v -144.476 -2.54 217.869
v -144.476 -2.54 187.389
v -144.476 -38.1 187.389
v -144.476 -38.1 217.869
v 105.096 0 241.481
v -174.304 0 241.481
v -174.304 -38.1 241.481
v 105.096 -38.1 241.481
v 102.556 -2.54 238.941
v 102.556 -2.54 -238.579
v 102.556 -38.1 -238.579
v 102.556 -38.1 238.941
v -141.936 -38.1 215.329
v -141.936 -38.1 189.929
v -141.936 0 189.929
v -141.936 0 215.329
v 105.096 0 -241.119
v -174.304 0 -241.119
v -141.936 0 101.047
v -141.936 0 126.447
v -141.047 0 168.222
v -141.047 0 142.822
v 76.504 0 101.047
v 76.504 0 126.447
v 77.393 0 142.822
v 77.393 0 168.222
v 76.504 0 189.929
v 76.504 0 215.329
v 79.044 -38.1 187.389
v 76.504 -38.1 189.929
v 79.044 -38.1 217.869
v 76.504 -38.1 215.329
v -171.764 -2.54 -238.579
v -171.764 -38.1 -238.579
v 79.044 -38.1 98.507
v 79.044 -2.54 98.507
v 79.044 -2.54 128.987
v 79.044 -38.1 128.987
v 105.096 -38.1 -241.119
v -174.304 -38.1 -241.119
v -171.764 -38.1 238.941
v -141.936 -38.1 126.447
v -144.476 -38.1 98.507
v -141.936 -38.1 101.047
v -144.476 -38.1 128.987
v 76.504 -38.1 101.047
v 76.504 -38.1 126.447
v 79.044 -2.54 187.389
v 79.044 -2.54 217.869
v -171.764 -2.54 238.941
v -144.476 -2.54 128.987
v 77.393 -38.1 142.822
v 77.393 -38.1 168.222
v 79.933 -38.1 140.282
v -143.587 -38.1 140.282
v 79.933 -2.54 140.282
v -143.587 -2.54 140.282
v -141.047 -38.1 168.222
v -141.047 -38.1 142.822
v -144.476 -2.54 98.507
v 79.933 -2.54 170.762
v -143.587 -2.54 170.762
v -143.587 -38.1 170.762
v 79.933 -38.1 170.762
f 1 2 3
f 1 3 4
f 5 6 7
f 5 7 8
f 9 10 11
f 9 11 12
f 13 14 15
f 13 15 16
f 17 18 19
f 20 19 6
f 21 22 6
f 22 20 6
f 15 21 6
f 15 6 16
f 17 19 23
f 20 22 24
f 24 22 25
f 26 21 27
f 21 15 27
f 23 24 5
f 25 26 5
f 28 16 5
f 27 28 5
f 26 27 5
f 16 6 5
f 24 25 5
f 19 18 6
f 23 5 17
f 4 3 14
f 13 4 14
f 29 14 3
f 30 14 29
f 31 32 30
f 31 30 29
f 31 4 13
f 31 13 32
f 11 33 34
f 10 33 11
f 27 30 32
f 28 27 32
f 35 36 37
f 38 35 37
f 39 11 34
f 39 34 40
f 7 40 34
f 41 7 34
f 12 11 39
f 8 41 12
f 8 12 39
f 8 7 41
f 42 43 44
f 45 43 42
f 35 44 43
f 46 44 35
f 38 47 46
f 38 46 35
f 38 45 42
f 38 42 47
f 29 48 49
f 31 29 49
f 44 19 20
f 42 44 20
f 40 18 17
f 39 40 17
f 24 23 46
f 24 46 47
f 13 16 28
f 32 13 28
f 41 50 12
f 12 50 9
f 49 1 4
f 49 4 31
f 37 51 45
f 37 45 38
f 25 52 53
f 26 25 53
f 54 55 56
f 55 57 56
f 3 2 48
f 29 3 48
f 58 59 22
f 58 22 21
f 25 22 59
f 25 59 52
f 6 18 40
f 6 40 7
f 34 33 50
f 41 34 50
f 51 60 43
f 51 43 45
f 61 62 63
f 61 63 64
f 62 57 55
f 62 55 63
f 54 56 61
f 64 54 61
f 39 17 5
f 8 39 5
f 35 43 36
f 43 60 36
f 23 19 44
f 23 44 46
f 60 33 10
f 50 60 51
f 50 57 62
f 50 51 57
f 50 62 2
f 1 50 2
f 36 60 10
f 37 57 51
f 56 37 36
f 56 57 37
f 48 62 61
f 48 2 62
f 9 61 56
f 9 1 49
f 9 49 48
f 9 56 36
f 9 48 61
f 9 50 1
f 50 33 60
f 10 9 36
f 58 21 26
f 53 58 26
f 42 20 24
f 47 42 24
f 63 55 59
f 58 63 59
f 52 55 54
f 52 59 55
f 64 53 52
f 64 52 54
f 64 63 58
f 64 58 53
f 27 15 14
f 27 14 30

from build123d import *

# Parameters (mm, degrees)
F0_W     = 279.4
F0_H     = 482.6
F0_W_2   = 218.44
F0_H_2   = 25.4
F1_DEPTH = 38.1
F2_DEPTH = 25.4
F3_T     = -2.54


with BuildPart() as f1:
    # F0 (on Front) → F1 (new body)
    with BuildSketch(Plane.XZ):
        with Locations((-34.6037362662, 0.1808144152)):
            Rectangle(F0_W, F0_H)
        with Locations((-32.7158253479, 113.7473966599)):
            Rectangle(F0_W_2, F0_H_2, mode=Mode.SUBTRACT)
        with Locations((-31.8270157862, 155.5219079971)):
            Rectangle(F0_W_2, F0_H_2, mode=Mode.SUBTRACT)
        with Locations((-32.7158253479, 202.6293214083)):
            Rectangle(F0_W_2, F0_H_2, mode=Mode.SUBTRACT)
    extrude(amount=F1_DEPTH)

    # F0 (on Front) → F2 (join)
    with BuildSketch(Plane.XZ):
        with Locations((-34.6037362662, 0.1808144152)):
            Rectangle(F0_W, F0_H)
        with Locations((-32.7158253479, 113.7473966599)):
            Rectangle(F0_W_2, F0_H_2, mode=Mode.SUBTRACT)
        with Locations((-31.8270157862, 155.5219079971)):
            Rectangle(F0_W_2, F0_H_2, mode=Mode.SUBTRACT)
        with Locations((-32.7158253479, 202.6293214083)):
            Rectangle(F0_W_2, F0_H_2, mode=Mode.SUBTRACT)
    extrude(amount=F2_DEPTH)

    # F3
    f3_openings = [f1.faces().sort_by_distance(p)[0] for p in [
        (-34.911334, -38.1, -21.946168),
    ]]
    offset(amount=F3_T, openings=f3_openings, kind=Kind.INTERSECTION)


solid = f1.part
